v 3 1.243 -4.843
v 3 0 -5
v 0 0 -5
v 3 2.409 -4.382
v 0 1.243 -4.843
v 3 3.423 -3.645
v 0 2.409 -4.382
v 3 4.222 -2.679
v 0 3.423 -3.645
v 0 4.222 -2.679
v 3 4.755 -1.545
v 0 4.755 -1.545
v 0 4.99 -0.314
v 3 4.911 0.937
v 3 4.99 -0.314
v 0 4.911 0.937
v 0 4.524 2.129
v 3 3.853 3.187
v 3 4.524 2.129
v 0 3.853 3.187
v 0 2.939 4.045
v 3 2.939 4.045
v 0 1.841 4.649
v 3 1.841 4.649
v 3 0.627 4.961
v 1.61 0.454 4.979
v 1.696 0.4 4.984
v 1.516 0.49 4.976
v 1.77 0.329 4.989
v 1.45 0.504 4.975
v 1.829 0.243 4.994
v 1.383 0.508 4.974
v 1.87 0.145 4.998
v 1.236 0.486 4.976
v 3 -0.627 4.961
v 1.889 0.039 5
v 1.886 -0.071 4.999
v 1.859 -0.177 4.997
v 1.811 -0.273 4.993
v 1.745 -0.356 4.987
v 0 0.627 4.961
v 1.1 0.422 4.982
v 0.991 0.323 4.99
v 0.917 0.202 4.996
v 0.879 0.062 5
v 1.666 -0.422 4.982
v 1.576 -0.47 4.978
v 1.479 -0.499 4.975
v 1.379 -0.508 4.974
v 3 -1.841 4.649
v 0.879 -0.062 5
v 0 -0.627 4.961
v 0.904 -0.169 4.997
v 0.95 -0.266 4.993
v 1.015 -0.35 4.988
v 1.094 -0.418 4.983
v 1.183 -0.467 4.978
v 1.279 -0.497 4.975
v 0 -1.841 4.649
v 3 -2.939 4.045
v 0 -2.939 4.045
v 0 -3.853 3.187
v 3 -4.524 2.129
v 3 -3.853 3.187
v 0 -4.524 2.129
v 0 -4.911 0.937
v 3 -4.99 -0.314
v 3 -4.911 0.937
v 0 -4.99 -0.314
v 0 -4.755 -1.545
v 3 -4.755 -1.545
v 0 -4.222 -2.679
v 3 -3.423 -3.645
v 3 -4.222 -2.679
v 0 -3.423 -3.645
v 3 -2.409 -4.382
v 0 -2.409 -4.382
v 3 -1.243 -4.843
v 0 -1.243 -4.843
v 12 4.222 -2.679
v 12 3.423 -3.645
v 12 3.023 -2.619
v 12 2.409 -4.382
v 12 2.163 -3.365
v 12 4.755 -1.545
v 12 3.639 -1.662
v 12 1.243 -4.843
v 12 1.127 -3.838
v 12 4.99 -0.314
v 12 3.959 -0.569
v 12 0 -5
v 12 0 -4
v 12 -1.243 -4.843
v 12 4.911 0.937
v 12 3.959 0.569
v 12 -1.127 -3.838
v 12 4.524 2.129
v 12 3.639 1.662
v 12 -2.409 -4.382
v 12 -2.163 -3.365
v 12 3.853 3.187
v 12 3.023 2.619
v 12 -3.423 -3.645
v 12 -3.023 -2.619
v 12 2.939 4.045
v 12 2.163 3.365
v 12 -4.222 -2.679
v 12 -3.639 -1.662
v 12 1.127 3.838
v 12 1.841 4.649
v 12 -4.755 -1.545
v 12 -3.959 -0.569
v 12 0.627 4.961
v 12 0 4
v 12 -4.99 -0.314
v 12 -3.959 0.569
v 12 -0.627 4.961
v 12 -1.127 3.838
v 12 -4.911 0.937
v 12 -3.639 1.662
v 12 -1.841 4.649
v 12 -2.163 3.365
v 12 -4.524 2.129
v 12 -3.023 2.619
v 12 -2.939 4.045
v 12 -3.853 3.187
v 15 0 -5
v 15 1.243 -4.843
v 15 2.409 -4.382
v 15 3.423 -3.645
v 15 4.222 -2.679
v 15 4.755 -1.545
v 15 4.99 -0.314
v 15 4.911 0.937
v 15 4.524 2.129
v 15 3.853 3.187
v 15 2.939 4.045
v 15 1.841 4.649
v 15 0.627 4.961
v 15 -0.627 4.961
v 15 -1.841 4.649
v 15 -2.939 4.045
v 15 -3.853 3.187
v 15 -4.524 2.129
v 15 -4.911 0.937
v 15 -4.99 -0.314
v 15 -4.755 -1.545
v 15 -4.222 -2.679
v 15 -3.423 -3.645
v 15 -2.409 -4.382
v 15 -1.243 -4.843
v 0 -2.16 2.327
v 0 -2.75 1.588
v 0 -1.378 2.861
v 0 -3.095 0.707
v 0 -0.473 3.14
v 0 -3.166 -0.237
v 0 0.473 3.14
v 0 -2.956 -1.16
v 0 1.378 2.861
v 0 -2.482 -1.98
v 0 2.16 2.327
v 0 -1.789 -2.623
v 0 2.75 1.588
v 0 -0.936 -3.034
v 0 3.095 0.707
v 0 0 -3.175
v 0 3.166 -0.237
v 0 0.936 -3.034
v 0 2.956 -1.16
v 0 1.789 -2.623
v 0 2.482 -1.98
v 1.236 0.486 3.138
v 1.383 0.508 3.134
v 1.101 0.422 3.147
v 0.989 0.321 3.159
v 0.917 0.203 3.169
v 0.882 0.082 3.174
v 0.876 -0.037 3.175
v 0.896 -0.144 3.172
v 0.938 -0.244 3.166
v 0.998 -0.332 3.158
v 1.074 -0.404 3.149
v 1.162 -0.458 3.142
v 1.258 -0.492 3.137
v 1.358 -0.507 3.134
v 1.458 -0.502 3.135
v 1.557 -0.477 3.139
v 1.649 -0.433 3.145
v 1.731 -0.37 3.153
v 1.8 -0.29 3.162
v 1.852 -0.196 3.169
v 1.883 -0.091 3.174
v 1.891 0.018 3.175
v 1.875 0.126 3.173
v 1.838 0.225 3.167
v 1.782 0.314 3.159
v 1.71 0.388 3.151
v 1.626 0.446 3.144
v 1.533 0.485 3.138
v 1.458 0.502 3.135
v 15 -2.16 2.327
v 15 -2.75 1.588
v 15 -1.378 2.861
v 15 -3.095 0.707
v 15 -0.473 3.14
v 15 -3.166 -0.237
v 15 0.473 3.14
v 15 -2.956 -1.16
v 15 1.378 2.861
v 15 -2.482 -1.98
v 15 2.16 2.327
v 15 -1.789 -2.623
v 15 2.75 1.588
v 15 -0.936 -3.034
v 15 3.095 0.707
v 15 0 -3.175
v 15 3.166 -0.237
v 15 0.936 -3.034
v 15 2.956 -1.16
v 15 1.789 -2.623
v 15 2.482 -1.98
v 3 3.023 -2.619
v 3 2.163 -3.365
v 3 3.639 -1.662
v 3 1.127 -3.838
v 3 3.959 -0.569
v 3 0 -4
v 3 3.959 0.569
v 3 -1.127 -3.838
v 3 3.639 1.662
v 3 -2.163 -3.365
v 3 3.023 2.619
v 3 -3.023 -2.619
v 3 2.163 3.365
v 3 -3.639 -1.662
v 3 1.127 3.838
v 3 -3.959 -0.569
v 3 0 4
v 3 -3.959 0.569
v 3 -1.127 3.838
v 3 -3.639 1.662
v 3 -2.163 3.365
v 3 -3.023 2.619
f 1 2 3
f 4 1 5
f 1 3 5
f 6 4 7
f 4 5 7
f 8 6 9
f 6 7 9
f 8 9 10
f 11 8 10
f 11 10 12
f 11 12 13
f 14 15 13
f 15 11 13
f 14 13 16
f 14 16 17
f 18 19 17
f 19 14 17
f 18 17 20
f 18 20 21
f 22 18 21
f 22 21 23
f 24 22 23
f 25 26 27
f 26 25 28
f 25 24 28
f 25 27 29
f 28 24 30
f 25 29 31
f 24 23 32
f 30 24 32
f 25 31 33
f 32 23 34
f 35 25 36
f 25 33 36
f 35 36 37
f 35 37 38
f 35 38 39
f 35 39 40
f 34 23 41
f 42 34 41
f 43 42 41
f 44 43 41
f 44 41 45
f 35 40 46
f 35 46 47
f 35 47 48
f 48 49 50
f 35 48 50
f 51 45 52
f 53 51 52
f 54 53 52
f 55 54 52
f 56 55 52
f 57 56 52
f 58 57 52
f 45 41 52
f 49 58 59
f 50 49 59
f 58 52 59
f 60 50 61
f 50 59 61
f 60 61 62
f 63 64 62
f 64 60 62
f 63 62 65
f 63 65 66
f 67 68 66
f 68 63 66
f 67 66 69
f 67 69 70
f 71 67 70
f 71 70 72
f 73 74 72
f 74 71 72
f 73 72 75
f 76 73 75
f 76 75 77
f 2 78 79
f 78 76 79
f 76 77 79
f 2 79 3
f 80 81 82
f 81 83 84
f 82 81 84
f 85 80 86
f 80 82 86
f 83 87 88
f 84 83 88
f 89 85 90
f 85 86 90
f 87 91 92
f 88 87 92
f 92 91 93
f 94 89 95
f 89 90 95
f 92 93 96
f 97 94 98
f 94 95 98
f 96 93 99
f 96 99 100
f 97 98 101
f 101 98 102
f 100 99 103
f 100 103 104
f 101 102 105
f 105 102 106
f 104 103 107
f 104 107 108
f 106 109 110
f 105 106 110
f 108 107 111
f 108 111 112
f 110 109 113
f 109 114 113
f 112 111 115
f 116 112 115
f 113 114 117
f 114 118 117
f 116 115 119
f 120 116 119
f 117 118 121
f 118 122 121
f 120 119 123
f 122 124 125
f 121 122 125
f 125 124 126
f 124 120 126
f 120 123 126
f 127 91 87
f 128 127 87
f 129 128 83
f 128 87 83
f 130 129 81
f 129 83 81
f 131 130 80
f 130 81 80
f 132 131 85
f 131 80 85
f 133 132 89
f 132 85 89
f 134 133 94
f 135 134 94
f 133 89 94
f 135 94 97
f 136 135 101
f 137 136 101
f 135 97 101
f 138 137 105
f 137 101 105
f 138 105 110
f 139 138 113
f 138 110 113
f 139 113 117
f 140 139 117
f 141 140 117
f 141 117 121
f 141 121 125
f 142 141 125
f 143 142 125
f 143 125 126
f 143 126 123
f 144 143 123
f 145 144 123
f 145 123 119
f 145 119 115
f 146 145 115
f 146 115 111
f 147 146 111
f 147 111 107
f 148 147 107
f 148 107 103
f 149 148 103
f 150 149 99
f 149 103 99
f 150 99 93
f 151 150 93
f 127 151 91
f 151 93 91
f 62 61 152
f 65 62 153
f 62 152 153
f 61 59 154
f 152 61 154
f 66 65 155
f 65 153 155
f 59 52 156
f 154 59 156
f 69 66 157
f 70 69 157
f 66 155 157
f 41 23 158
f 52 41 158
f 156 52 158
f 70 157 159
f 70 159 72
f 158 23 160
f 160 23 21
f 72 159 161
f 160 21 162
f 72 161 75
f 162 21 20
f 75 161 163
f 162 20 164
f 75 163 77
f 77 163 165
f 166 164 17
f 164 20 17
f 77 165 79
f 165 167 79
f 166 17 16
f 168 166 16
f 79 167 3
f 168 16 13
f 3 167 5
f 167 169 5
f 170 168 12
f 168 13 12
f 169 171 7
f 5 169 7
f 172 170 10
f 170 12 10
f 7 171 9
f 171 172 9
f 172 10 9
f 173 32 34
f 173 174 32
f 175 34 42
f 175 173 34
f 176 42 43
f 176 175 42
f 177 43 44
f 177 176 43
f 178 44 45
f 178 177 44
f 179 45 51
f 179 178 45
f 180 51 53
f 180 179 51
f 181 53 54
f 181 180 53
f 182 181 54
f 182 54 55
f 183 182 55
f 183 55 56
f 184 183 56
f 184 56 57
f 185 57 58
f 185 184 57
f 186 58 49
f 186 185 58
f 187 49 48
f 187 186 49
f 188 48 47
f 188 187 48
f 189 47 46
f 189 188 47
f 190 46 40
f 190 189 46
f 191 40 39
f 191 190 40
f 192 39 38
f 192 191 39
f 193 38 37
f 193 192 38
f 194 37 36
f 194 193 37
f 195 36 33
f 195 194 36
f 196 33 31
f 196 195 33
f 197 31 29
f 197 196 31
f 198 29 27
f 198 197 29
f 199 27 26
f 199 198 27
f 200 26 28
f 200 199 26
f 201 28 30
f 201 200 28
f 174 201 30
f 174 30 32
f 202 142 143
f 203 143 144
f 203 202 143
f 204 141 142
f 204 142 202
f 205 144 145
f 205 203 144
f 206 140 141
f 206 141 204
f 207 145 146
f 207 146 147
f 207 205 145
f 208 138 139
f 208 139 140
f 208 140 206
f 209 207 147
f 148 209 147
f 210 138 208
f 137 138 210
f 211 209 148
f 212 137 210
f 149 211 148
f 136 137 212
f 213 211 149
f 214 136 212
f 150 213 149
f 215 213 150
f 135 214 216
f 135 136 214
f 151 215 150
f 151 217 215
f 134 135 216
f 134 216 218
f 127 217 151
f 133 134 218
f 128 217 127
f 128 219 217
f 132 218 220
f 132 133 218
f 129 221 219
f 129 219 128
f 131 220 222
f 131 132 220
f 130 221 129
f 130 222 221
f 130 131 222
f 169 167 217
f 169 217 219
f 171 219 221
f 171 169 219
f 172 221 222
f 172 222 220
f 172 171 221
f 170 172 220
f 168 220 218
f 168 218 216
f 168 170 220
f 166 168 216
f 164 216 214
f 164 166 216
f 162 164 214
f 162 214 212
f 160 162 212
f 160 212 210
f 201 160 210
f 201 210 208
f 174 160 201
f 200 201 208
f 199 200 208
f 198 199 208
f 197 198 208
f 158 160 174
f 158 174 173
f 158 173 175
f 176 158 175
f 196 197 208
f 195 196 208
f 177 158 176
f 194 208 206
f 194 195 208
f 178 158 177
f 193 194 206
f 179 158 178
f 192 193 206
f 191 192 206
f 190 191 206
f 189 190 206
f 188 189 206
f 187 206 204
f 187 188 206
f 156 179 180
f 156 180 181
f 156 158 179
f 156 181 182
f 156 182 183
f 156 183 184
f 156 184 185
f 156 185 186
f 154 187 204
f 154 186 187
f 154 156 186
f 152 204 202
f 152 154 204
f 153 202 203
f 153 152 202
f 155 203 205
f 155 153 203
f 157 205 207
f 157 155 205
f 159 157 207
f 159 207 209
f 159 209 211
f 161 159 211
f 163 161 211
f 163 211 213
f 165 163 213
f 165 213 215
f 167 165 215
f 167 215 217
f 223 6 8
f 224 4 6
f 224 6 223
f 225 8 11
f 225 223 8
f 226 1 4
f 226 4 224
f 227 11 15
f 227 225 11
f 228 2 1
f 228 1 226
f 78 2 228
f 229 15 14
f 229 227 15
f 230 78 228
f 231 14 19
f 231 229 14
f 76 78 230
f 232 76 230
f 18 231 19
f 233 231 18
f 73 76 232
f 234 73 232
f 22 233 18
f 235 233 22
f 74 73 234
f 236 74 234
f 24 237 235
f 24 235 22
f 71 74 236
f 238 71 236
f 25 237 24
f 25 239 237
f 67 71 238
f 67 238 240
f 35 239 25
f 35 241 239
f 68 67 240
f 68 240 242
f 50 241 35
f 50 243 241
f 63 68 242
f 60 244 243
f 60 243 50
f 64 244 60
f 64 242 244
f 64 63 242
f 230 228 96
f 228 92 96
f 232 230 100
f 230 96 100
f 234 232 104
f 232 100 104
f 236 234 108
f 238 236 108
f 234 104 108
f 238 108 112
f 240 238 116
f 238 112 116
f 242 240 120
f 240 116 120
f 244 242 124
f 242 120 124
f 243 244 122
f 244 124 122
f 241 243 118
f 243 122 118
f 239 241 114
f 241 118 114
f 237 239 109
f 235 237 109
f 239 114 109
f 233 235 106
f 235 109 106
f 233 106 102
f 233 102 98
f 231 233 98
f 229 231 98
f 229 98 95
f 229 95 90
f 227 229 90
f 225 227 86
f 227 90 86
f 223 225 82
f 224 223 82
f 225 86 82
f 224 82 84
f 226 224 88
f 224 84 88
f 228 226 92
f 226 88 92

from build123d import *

# Parameters (mm, degrees)
SKETCH1_R           = 5
SKETCH1_R_2         = 3.175
BOSS_EXTRUDE1_DEPTH = 15
SKETCH2_W           = 9
SKETCH2_H           = 1


with BuildPart() as part:
    # Sketch1 → Boss-Extrude1 (new body)
    with BuildSketch(Plane(origin=(0, 0, 0), x_dir=(0, 0, -1), z_dir=(1, 0, 0))):
        Circle(SKETCH1_R)
        Circle(SKETCH1_R_2, mode=Mode.SUBTRACT)
    extrude(amount=BOSS_EXTRUDE1_DEPTH)

    # Sketch2 → Cut-Revolve1 (revolve, cut)
    with BuildSketch(Plane.XY, mode=Mode.PRIVATE) as cut_revolve1_sk:
        with Locations((7.5, 4.5)):
            Rectangle(SKETCH2_W, SKETCH2_H)
    revolve(cut_revolve1_sk.sketch.rotate(Axis((15, 0, 0), (-1, 0, 0)), 90), axis=Axis((15, 0, 0), (-1, 0, 0)), mode=Mode.SUBTRACT)

    # Sketch3 → #60 (0.04) Diameter Hole1 (revolve, cut)
    with BuildSketch(Plane.YZ.offset(1.382942836)):
        Polygon((0, 0), (0, 25.705237194), (0.508, 25.4), (0.508, 0), align=None)
    revolve(axis=Axis((1.382942836, 0, -6.35), (0, 0, 1)), mode=Mode.SUBTRACT)


solid = part.part
